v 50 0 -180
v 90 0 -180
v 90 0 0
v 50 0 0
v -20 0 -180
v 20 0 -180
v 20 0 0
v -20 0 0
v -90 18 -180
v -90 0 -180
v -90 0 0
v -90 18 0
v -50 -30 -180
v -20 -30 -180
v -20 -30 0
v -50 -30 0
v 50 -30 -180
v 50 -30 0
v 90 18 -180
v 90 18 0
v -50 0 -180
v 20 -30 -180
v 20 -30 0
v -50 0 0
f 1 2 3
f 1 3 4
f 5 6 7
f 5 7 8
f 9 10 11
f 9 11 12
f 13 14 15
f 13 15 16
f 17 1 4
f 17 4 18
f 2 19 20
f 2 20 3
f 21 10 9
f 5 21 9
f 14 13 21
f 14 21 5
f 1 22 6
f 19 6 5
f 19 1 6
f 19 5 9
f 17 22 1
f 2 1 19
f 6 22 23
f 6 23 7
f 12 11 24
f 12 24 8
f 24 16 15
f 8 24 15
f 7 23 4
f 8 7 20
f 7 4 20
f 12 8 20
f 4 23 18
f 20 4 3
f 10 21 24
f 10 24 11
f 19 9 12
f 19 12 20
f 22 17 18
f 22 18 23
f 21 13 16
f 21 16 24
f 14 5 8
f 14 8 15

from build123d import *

# Parameters (mm, degrees)
F1_DEPTH = 4572
F2_SCALE = 0.0393700787
F3_ANGLE = 180


with BuildPart() as f1:
    # F0 (on Top) → F1 (new body)
    with BuildSketch(Plane.XY):
        Polygon((508, 0), (0, 0), (-508, 0), (-508, 762), (-1270, 762), (-1270, 0), (-2286, 0), (-2286, -457.2), (0, -457.2), (2286, -457.2), (2286, 0), (1270, 0), (1270, 762), (508, 762), align=None)
    extrude(amount=F1_DEPTH)


with BuildPart() as f1_1:
    # F2: moved
    add(f1.part.scale(F2_SCALE))


with BuildPart() as f1_2:
    # F3: moved
    add(f1_1.part.rotate(Axis((0, 0, 0), (1, 0, 0)), F3_ANGLE))


solid = f1_2.part
